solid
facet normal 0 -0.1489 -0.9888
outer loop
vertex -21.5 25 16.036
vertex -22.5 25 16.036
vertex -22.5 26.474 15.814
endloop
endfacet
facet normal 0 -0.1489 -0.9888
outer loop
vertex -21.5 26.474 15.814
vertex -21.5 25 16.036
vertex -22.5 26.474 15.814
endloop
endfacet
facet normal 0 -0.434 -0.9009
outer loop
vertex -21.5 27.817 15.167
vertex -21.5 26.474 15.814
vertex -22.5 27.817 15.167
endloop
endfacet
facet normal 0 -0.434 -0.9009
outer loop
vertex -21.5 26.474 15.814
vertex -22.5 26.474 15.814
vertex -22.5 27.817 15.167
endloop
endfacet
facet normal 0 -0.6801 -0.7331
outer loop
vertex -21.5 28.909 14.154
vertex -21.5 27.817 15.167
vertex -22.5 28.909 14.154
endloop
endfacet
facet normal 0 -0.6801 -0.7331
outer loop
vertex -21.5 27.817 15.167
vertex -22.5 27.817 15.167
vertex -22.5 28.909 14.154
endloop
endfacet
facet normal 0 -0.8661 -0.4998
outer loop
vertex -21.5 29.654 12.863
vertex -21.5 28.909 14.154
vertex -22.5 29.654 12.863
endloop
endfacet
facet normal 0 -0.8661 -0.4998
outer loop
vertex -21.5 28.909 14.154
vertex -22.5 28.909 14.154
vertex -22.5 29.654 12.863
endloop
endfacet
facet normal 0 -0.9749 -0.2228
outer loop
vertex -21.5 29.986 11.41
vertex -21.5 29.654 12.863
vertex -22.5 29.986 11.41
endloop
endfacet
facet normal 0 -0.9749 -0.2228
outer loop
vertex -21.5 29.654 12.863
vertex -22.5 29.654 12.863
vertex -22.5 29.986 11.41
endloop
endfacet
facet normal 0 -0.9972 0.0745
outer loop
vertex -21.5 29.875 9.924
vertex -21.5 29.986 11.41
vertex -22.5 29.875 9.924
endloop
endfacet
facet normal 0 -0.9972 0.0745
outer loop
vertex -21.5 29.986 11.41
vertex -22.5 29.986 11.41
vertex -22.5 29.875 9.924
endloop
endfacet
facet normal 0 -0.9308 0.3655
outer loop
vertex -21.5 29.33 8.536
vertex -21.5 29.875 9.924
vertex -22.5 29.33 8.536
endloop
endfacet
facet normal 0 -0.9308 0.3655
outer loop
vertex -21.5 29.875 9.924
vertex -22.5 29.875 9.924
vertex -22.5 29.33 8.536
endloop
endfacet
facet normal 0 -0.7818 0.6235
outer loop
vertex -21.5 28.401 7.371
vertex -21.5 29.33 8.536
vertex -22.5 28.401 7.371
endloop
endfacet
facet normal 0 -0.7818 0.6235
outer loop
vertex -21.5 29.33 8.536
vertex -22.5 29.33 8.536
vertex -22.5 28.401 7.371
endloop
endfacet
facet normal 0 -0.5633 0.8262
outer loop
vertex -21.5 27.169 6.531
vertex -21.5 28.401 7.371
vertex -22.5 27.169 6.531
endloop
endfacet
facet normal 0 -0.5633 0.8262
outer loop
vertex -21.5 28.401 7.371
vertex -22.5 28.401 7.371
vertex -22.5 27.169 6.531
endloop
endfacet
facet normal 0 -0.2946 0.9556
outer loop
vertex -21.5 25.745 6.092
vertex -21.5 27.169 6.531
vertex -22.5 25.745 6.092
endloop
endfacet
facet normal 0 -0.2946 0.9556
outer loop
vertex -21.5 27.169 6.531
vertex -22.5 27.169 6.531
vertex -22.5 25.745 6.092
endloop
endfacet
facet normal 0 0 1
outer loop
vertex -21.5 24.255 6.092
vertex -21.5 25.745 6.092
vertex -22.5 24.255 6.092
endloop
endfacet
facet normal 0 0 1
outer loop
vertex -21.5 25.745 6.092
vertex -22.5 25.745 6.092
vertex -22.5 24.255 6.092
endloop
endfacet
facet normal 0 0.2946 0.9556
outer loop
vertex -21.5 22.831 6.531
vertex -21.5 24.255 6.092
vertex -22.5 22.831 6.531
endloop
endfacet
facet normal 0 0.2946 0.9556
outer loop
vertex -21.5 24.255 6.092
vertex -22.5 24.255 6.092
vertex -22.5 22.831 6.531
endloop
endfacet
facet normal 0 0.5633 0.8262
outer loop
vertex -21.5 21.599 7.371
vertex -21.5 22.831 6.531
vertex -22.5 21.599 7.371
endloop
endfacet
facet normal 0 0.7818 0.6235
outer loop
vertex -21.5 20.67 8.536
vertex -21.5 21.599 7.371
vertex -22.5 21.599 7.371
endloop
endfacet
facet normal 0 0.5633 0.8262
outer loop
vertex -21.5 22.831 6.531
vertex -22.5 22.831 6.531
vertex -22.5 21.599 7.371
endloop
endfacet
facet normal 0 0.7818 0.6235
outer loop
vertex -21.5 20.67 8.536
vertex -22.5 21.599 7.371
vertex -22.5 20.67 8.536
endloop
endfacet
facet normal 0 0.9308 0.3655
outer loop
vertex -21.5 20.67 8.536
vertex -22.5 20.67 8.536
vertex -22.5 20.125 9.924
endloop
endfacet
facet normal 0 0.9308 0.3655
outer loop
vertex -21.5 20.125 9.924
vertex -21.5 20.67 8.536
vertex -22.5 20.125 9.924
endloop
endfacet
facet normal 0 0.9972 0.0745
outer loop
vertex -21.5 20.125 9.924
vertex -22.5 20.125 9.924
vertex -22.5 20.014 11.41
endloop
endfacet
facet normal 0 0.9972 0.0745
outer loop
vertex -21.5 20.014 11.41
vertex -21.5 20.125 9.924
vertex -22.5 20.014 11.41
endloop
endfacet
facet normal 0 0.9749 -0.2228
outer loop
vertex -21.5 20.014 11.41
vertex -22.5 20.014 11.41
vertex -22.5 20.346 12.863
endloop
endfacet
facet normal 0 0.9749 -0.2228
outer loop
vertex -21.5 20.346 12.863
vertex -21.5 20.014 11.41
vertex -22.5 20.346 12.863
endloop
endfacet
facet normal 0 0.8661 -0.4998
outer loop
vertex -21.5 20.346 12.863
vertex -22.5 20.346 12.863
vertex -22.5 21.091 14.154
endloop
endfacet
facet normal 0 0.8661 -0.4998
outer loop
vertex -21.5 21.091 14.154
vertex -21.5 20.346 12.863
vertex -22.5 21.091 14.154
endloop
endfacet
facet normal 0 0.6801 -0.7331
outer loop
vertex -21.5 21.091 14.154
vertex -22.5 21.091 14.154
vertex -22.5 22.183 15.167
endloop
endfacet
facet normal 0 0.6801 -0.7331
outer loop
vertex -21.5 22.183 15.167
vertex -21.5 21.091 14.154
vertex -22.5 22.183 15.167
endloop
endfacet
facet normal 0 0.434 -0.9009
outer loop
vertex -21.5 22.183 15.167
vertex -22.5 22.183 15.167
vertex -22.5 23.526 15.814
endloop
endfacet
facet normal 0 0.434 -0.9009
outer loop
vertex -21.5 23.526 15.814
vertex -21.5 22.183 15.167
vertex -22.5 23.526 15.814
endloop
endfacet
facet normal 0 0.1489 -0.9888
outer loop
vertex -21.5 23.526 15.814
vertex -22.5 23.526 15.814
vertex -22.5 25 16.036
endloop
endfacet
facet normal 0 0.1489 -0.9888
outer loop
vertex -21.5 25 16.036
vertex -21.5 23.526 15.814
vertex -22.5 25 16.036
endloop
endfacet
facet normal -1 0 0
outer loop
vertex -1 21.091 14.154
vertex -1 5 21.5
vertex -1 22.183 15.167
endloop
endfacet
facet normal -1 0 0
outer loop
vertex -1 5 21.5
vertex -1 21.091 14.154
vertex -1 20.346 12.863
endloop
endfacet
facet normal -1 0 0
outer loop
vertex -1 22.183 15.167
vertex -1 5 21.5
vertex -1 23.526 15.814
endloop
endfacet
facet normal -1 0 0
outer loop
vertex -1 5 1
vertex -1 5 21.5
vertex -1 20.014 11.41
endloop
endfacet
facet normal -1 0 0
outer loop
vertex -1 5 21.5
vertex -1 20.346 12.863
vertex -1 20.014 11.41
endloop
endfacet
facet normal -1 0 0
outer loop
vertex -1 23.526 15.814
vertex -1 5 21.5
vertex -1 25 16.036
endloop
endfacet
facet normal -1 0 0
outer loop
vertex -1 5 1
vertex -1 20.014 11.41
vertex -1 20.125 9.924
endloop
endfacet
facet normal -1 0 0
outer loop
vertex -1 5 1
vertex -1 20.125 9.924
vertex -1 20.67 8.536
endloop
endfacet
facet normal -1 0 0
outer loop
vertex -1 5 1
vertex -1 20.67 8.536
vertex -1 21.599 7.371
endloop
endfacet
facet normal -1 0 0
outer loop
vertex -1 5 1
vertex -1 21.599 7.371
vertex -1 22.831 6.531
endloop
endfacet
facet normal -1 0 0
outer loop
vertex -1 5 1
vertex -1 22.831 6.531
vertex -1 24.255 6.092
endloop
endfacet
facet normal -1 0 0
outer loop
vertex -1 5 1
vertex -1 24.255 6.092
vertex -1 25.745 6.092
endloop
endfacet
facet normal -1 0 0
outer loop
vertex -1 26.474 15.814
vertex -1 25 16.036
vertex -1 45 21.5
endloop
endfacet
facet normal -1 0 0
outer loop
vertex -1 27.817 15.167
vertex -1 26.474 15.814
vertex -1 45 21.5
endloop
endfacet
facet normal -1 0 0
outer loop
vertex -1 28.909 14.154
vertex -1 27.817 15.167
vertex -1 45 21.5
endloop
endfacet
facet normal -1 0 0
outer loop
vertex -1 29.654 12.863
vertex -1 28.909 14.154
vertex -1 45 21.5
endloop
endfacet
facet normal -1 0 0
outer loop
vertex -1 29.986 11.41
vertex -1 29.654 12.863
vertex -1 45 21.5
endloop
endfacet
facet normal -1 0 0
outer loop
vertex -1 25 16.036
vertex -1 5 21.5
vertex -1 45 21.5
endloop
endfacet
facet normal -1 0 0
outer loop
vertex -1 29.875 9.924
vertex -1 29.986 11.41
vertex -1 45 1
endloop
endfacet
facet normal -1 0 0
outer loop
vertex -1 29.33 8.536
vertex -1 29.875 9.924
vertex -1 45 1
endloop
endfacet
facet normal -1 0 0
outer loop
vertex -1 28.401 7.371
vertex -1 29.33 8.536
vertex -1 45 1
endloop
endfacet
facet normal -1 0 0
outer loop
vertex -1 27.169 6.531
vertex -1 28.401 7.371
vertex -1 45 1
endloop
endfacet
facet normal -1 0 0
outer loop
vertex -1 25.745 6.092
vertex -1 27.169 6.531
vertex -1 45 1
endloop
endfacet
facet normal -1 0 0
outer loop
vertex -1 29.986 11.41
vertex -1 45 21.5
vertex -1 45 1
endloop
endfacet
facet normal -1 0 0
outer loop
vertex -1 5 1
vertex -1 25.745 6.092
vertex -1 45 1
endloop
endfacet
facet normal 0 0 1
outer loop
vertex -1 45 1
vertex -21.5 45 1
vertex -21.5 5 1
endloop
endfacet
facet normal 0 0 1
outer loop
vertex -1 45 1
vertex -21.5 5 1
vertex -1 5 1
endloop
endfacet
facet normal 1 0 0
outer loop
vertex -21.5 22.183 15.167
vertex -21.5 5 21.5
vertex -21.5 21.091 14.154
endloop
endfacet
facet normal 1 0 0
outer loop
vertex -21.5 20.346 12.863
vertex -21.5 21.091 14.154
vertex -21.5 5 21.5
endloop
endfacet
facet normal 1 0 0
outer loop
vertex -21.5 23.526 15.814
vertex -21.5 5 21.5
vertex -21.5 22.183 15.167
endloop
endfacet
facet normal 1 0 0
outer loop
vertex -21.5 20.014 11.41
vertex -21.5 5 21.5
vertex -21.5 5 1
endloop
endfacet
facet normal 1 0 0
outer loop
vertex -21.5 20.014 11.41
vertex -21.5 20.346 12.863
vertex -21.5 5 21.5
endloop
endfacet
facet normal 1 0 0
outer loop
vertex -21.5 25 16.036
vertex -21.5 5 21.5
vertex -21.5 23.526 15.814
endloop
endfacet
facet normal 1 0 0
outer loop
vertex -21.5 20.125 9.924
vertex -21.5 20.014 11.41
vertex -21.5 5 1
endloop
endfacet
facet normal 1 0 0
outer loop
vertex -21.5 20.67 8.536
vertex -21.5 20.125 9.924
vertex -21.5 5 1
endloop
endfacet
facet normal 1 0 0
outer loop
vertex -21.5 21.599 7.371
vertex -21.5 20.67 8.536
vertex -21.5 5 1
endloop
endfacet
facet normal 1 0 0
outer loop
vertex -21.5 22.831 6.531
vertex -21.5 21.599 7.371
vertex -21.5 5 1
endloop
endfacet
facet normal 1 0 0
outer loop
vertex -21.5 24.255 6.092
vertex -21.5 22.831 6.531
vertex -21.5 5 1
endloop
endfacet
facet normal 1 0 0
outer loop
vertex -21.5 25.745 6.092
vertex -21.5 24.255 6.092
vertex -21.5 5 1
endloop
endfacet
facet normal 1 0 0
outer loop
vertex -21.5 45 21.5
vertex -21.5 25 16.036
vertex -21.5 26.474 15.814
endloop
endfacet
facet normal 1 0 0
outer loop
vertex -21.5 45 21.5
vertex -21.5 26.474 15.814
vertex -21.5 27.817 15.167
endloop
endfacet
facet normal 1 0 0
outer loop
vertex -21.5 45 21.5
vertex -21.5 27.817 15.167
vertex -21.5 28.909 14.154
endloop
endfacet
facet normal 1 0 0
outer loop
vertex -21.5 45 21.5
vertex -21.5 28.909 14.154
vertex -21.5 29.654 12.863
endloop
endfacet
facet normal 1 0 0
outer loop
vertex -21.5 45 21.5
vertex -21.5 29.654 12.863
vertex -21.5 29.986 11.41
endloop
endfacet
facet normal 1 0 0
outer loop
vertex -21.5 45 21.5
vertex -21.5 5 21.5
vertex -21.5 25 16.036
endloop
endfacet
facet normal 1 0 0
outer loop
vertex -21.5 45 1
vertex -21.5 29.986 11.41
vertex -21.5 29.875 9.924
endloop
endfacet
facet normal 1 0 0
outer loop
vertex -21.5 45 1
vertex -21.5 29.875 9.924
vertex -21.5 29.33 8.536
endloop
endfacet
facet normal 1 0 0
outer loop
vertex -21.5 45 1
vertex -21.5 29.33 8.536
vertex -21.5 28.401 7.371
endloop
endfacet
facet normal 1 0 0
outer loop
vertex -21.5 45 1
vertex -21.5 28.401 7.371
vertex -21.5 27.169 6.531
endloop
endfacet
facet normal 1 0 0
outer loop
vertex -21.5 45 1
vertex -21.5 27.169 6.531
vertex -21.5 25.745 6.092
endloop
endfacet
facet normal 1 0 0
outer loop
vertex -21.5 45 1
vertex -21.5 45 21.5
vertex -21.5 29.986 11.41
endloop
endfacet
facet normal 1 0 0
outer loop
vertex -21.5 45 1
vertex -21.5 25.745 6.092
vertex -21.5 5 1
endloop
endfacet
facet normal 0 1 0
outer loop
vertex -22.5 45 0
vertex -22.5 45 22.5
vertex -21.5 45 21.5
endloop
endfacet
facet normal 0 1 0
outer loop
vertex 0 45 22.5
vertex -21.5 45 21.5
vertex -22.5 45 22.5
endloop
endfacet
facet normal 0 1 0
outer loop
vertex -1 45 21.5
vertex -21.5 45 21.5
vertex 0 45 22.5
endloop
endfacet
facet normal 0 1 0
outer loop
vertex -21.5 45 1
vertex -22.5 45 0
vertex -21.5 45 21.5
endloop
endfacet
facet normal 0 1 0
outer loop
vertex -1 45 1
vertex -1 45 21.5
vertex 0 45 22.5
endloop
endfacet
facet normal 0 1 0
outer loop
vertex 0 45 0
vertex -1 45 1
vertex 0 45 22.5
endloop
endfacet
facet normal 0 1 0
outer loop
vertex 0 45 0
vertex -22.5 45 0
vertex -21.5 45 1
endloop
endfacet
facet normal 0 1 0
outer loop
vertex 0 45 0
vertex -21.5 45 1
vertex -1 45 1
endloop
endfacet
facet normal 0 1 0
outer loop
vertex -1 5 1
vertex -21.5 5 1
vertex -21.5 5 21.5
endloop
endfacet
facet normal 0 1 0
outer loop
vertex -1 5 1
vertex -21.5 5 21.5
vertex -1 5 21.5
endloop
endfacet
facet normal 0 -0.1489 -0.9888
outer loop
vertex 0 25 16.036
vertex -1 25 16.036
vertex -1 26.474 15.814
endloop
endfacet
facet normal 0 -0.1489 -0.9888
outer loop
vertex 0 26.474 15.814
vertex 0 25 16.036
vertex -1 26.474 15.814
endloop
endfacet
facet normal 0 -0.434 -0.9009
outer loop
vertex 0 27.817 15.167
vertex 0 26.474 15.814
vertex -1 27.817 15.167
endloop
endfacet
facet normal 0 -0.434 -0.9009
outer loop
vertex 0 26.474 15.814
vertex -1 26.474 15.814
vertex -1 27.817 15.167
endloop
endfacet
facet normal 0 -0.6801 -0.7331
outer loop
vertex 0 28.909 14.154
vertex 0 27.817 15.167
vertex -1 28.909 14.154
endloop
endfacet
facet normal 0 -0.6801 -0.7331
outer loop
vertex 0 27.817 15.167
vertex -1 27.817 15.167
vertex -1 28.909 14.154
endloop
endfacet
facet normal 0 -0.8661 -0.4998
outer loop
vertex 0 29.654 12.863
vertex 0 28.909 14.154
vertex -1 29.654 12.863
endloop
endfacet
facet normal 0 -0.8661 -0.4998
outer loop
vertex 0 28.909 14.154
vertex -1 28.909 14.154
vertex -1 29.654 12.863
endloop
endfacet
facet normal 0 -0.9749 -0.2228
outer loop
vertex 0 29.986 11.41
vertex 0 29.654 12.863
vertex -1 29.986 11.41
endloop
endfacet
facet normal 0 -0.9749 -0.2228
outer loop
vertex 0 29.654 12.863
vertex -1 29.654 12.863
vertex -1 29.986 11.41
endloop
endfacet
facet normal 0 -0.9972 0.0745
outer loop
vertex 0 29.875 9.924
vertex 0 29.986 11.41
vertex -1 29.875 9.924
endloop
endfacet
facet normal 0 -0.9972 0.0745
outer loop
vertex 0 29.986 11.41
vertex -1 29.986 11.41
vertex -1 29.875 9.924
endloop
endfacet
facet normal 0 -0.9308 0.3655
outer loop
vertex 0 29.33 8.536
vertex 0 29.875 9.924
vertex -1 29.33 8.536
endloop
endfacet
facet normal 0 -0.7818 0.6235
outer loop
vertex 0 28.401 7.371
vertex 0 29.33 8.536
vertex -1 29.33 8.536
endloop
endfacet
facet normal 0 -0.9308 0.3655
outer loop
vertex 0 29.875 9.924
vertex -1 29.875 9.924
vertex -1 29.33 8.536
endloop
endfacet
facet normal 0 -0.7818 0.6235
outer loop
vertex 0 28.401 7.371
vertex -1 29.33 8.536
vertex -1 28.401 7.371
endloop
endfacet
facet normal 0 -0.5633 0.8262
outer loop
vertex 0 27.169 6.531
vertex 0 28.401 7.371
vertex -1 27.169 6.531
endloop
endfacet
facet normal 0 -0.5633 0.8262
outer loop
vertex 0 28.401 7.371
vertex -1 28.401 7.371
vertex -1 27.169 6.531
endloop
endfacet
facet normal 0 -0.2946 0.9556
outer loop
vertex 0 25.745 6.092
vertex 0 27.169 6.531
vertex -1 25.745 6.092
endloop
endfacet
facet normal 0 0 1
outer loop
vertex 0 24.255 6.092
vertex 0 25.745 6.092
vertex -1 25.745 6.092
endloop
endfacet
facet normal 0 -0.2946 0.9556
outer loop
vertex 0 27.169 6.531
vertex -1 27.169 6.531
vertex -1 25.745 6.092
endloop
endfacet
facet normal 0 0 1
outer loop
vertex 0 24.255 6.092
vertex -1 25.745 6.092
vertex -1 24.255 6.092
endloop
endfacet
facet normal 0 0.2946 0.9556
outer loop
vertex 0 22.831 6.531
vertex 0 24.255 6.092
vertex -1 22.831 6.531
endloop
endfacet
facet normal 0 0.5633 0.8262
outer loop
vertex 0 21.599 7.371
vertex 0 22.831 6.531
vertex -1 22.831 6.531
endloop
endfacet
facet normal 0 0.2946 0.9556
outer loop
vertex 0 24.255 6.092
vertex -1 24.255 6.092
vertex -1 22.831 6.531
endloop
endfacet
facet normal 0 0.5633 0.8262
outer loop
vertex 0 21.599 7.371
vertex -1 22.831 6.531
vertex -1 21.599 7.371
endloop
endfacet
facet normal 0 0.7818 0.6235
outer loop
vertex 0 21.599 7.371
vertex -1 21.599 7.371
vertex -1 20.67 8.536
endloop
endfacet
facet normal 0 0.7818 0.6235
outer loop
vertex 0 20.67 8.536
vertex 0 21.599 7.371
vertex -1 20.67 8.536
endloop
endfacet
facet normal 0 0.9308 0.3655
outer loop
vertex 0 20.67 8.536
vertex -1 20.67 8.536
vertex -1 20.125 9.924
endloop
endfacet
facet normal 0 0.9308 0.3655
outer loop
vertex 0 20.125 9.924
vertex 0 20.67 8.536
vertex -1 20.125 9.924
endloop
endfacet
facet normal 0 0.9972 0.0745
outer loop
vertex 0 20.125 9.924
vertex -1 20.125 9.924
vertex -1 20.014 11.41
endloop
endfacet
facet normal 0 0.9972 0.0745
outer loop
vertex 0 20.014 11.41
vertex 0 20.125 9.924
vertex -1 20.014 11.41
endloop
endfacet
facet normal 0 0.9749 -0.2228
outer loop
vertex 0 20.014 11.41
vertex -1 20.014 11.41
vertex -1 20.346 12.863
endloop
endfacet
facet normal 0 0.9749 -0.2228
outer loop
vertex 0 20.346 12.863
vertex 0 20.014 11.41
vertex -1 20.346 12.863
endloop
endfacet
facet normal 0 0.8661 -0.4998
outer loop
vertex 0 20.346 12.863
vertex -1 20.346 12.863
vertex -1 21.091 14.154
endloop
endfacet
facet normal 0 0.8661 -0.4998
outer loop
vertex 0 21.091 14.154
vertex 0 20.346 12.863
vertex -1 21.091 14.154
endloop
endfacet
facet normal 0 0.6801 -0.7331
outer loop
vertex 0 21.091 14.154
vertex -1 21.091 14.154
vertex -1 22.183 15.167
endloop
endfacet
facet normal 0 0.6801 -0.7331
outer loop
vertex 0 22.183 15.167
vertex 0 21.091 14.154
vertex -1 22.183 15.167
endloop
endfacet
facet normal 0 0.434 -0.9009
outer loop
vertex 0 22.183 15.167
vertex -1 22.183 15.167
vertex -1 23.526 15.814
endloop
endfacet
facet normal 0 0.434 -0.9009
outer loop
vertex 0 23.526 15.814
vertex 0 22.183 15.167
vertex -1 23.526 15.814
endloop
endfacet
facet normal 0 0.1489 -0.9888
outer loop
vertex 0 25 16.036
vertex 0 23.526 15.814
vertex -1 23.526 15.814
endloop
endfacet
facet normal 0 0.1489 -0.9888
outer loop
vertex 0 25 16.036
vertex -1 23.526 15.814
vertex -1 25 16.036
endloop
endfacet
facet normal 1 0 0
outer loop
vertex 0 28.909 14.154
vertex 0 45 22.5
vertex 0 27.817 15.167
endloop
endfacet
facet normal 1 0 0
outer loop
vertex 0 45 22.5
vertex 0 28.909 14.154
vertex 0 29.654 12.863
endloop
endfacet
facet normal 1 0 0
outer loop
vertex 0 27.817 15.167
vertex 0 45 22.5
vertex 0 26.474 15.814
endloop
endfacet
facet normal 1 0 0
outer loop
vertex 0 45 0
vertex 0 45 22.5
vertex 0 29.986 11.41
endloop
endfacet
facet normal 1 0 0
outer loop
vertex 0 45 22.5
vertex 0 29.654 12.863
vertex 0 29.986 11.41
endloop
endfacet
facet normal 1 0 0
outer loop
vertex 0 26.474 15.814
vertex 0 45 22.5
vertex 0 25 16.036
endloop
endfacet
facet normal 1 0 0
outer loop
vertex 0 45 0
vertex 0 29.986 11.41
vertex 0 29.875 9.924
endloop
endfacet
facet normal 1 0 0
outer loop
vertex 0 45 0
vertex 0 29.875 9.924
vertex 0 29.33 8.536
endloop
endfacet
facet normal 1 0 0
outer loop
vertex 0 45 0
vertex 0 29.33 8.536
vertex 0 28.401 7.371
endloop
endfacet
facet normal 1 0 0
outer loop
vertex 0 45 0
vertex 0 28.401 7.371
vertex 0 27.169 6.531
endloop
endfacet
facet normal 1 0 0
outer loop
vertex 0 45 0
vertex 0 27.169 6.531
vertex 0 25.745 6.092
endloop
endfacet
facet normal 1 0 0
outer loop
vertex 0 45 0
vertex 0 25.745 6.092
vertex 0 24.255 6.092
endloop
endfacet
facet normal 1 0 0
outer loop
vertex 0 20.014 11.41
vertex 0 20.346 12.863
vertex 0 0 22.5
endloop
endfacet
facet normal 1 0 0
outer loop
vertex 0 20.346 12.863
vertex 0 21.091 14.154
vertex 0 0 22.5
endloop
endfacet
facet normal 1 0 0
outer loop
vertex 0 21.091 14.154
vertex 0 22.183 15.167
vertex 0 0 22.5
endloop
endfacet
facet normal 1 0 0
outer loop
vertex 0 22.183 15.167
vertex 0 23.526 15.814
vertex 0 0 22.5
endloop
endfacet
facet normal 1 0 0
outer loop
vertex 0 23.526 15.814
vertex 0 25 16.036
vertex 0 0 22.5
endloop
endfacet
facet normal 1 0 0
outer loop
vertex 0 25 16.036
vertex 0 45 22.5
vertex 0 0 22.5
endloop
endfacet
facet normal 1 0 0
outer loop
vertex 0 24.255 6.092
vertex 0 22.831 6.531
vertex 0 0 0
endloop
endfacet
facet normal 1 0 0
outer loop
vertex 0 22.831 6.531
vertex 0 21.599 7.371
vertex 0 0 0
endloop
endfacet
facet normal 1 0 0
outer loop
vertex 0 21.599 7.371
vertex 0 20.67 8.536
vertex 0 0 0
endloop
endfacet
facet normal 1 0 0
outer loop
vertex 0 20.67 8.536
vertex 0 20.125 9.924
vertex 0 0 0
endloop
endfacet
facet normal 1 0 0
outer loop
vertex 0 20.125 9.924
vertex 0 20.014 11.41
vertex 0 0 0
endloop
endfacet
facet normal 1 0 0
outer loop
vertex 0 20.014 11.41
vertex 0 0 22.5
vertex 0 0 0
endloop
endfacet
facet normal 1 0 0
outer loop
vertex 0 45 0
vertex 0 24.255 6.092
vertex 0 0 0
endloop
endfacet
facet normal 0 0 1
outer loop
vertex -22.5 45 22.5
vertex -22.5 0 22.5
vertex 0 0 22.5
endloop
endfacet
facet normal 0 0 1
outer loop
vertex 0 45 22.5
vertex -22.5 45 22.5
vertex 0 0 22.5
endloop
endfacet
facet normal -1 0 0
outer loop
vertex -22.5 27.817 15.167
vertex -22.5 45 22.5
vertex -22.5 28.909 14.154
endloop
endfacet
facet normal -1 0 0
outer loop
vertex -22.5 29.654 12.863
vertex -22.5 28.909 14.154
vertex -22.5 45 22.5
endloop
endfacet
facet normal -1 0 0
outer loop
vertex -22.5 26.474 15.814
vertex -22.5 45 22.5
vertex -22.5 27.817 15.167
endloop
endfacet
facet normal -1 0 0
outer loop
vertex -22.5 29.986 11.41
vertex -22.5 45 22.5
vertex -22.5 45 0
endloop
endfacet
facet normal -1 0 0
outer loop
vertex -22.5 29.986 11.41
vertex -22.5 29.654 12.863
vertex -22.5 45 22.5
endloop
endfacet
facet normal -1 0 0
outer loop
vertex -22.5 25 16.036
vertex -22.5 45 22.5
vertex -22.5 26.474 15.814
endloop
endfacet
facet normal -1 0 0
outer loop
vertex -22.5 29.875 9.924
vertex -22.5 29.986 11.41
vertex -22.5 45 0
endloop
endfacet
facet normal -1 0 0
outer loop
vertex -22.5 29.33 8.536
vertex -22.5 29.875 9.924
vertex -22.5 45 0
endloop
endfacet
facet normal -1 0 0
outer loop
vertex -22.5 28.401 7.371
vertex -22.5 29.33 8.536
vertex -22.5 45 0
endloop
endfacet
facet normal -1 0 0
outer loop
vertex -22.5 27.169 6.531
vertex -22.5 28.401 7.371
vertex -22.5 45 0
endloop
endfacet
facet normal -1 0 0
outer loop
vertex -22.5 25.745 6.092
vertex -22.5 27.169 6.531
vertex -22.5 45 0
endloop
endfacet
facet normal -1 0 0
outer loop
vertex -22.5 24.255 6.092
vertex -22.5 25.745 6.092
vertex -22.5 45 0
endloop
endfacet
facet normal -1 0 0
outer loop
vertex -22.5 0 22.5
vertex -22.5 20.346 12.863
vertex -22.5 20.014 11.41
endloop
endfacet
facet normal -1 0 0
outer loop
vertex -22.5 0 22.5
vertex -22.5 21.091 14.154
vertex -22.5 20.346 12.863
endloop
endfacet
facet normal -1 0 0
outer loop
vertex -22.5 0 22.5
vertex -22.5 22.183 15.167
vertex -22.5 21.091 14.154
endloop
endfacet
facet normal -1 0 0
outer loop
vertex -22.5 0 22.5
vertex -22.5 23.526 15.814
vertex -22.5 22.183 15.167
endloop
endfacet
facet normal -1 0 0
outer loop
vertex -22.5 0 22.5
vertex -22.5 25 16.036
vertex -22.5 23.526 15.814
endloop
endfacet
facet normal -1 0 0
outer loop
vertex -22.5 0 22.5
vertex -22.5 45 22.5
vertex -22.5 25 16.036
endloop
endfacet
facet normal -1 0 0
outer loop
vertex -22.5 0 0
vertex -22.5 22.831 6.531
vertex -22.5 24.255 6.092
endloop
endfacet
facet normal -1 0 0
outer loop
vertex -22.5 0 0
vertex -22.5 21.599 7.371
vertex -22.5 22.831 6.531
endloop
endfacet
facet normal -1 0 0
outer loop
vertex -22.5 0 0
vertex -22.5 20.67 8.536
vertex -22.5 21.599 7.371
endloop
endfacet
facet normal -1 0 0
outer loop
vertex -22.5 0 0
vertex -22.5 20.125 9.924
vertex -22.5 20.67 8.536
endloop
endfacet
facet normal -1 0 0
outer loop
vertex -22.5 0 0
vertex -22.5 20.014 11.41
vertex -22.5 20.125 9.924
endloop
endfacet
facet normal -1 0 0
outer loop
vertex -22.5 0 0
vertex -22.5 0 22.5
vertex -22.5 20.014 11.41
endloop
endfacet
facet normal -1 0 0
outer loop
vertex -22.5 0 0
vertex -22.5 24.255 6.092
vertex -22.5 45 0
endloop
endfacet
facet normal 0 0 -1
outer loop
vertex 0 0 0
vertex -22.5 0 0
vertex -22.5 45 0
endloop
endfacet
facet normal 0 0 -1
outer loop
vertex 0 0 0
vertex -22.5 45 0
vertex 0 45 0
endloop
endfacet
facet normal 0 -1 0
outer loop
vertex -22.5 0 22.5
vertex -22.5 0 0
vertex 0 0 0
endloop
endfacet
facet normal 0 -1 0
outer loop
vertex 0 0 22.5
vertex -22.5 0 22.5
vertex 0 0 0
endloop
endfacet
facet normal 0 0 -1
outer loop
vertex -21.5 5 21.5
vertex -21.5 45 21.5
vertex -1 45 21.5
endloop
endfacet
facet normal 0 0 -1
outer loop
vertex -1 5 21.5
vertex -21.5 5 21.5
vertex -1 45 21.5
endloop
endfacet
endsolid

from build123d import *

# Parameters (mm, degrees)
SKETCH_1_W          = 22.5
SKETCH_1_H          = 22.5
EXTRUDE_1_DEPTH     = 45
SKETCH_2_W          = 20.5
SKETCH_2_H          = 20.5
CUT_EXTRUDE_1_DEPTH = 40
SKETCH_3_R          = 5
CUT_EXTRUDE_2_DEPTH = 40


with BuildPart() as part:
    # 草图1 → 凸台-拉伸1 (new body)
    with BuildSketch(Plane(origin=(0, 0, 0), x_dir=(1, 0, 0), z_dir=(0, 1, 0))):
        with Locations((-11.25, -11.25)):
            Rectangle(SKETCH_1_W, SKETCH_1_H)
    extrude(amount=EXTRUDE_1_DEPTH)

    # 草图2 → 切除-拉伸1 (cut)
    with BuildSketch(Plane(origin=(0, 45, 0), x_dir=(1, 0, 0), z_dir=(0, 1, 0))):
        with Locations((-11.25, -11.25)):
            Rectangle(SKETCH_2_W, SKETCH_2_H)
    extrude(amount=-CUT_EXTRUDE_1_DEPTH, mode=Mode.SUBTRACT)

    # 草图3 → 切除-拉伸2 (cut)
    with BuildSketch(Plane.ZY.offset(22.5)):
        with Locations((11.036111031, 25)):
            Circle(SKETCH_3_R)
    extrude(amount=-CUT_EXTRUDE_2_DEPTH, mode=Mode.SUBTRACT)


solid = part.part
